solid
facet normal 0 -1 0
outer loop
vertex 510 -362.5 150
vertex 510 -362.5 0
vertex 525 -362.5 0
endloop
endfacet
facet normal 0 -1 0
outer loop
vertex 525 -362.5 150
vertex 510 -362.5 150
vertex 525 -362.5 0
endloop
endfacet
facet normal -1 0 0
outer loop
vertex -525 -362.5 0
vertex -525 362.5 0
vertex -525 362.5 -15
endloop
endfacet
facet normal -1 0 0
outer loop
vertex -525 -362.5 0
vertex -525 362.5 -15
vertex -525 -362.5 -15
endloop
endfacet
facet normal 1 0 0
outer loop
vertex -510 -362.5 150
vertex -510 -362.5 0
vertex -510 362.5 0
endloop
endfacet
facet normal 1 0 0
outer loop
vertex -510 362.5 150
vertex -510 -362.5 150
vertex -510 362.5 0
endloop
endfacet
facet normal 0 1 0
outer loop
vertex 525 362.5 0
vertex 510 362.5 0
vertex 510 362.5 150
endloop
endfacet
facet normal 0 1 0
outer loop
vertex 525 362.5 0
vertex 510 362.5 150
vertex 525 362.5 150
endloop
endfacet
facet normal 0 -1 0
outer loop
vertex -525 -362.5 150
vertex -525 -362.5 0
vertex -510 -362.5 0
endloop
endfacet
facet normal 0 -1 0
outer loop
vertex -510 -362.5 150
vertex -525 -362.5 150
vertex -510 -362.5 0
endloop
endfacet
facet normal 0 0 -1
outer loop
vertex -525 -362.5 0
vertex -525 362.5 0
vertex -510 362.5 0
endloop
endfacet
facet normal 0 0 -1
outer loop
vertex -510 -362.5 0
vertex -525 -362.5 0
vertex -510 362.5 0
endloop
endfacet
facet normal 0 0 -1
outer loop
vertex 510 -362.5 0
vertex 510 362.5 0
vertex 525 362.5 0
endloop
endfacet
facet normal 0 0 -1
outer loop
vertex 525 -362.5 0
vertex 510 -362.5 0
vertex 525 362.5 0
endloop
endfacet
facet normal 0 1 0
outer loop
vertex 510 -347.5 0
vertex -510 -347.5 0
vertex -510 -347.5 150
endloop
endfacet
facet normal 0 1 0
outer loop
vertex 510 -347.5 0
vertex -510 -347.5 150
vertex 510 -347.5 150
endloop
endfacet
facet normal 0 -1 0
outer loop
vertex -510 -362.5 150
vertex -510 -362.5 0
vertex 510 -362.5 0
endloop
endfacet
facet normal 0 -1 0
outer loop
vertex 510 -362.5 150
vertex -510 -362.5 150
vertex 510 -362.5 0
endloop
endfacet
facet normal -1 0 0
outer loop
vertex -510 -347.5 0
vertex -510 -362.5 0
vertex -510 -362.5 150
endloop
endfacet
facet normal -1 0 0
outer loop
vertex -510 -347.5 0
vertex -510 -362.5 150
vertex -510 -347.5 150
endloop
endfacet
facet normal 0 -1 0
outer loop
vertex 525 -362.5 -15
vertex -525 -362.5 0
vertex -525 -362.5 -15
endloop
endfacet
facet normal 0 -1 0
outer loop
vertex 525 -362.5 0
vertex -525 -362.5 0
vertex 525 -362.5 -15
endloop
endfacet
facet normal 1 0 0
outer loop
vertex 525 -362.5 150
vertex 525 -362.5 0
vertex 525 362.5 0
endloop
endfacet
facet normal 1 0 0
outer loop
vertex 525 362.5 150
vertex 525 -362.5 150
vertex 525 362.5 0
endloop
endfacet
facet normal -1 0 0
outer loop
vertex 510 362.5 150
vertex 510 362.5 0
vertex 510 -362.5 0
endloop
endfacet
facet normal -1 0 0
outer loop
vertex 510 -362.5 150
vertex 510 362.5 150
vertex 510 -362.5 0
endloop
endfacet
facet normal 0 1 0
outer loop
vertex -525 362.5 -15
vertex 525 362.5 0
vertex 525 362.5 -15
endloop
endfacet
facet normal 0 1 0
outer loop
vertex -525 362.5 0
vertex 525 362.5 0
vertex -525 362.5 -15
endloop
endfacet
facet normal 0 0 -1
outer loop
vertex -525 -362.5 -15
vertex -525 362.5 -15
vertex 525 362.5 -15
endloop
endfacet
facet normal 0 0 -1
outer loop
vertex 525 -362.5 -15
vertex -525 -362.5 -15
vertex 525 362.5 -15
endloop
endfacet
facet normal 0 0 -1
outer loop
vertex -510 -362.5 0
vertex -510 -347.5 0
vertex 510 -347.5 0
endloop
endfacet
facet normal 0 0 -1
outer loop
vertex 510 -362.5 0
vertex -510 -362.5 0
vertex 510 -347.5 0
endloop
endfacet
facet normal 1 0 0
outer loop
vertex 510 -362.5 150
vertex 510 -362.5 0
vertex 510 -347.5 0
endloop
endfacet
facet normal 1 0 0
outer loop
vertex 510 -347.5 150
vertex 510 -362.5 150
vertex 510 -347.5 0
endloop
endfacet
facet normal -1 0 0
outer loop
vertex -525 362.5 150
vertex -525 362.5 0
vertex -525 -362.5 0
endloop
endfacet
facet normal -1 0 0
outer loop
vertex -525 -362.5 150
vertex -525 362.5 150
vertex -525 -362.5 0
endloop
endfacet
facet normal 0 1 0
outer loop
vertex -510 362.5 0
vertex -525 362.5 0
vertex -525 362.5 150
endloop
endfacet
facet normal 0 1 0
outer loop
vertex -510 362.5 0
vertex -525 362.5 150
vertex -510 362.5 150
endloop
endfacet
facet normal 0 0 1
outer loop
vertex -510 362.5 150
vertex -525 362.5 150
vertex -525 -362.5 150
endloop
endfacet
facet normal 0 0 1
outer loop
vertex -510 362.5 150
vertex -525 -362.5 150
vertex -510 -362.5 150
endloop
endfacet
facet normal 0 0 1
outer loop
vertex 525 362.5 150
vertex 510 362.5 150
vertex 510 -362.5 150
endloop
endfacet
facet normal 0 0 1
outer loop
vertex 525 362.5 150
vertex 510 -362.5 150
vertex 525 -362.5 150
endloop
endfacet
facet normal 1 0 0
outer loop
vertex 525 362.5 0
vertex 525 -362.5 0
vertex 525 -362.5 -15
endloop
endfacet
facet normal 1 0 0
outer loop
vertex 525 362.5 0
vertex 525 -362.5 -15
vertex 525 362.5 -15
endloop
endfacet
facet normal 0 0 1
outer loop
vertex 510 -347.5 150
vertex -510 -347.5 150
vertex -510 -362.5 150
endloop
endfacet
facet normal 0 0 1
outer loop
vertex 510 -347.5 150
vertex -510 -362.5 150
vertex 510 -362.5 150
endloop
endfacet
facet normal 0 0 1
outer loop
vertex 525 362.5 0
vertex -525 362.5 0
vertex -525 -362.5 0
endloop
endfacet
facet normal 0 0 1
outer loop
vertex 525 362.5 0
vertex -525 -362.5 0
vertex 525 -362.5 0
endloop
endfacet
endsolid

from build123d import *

# Parameters (mm, degrees)
F0_W     = 15
F0_H     = 710
F0_H_2   = 15
F3_DEPTH = 150
F0_W_2   = 1020
F1_DEPTH = 150
F2_DEPTH = 150
F4_DEPTH = 15


with BuildPart() as f3:
    # F0 (on Top) → F3 (new body)
    with BuildSketch(Plane.XY):
        with Locations((-517.5, 7.5)):
            Rectangle(F0_W, F0_H)
        with Locations((-517.5, -355)):
            Rectangle(F0_W, F0_H_2)
    extrude(amount=F3_DEPTH)


with BuildPart() as f1:
    # F0 (on Top) → F1 (new body)
    with BuildSketch(Plane.XY):
        with Locations((0, -355)):
            Rectangle(F0_W_2, F0_H_2)
    extrude(amount=F1_DEPTH)


with BuildPart() as f2:
    # F0 (on Top) → F2 (new body)
    with BuildSketch(Plane.XY):
        with Locations((517.5, 7.5)):
            Rectangle(F0_W, F0_H)
        with Locations((517.5, -355)):
            Rectangle(F0_W, F0_H_2)
    extrude(amount=F2_DEPTH)


with BuildPart() as f4:
    # F0 (on Top) → F4 (new body)
    with BuildSketch(Plane.XY):
        with Locations((0, 7.5)):
            Rectangle(F0_W_2, F0_H)
        with Locations((-517.5, 7.5)):
            Rectangle(F0_W, F0_H)
        with Locations((0, -355)):
            Rectangle(F0_W_2, F0_H_2)
        with Locations((-517.5, -355)):
            Rectangle(F0_W, F0_H_2)
        with Locations((517.5, 7.5)):
            Rectangle(F0_W, F0_H)
        with Locations((517.5, -355)):
            Rectangle(F0_W, F0_H_2)
    extrude(amount=-F4_DEPTH)


solid = Compound([f3.part, f1.part, f2.part, f4.part])
